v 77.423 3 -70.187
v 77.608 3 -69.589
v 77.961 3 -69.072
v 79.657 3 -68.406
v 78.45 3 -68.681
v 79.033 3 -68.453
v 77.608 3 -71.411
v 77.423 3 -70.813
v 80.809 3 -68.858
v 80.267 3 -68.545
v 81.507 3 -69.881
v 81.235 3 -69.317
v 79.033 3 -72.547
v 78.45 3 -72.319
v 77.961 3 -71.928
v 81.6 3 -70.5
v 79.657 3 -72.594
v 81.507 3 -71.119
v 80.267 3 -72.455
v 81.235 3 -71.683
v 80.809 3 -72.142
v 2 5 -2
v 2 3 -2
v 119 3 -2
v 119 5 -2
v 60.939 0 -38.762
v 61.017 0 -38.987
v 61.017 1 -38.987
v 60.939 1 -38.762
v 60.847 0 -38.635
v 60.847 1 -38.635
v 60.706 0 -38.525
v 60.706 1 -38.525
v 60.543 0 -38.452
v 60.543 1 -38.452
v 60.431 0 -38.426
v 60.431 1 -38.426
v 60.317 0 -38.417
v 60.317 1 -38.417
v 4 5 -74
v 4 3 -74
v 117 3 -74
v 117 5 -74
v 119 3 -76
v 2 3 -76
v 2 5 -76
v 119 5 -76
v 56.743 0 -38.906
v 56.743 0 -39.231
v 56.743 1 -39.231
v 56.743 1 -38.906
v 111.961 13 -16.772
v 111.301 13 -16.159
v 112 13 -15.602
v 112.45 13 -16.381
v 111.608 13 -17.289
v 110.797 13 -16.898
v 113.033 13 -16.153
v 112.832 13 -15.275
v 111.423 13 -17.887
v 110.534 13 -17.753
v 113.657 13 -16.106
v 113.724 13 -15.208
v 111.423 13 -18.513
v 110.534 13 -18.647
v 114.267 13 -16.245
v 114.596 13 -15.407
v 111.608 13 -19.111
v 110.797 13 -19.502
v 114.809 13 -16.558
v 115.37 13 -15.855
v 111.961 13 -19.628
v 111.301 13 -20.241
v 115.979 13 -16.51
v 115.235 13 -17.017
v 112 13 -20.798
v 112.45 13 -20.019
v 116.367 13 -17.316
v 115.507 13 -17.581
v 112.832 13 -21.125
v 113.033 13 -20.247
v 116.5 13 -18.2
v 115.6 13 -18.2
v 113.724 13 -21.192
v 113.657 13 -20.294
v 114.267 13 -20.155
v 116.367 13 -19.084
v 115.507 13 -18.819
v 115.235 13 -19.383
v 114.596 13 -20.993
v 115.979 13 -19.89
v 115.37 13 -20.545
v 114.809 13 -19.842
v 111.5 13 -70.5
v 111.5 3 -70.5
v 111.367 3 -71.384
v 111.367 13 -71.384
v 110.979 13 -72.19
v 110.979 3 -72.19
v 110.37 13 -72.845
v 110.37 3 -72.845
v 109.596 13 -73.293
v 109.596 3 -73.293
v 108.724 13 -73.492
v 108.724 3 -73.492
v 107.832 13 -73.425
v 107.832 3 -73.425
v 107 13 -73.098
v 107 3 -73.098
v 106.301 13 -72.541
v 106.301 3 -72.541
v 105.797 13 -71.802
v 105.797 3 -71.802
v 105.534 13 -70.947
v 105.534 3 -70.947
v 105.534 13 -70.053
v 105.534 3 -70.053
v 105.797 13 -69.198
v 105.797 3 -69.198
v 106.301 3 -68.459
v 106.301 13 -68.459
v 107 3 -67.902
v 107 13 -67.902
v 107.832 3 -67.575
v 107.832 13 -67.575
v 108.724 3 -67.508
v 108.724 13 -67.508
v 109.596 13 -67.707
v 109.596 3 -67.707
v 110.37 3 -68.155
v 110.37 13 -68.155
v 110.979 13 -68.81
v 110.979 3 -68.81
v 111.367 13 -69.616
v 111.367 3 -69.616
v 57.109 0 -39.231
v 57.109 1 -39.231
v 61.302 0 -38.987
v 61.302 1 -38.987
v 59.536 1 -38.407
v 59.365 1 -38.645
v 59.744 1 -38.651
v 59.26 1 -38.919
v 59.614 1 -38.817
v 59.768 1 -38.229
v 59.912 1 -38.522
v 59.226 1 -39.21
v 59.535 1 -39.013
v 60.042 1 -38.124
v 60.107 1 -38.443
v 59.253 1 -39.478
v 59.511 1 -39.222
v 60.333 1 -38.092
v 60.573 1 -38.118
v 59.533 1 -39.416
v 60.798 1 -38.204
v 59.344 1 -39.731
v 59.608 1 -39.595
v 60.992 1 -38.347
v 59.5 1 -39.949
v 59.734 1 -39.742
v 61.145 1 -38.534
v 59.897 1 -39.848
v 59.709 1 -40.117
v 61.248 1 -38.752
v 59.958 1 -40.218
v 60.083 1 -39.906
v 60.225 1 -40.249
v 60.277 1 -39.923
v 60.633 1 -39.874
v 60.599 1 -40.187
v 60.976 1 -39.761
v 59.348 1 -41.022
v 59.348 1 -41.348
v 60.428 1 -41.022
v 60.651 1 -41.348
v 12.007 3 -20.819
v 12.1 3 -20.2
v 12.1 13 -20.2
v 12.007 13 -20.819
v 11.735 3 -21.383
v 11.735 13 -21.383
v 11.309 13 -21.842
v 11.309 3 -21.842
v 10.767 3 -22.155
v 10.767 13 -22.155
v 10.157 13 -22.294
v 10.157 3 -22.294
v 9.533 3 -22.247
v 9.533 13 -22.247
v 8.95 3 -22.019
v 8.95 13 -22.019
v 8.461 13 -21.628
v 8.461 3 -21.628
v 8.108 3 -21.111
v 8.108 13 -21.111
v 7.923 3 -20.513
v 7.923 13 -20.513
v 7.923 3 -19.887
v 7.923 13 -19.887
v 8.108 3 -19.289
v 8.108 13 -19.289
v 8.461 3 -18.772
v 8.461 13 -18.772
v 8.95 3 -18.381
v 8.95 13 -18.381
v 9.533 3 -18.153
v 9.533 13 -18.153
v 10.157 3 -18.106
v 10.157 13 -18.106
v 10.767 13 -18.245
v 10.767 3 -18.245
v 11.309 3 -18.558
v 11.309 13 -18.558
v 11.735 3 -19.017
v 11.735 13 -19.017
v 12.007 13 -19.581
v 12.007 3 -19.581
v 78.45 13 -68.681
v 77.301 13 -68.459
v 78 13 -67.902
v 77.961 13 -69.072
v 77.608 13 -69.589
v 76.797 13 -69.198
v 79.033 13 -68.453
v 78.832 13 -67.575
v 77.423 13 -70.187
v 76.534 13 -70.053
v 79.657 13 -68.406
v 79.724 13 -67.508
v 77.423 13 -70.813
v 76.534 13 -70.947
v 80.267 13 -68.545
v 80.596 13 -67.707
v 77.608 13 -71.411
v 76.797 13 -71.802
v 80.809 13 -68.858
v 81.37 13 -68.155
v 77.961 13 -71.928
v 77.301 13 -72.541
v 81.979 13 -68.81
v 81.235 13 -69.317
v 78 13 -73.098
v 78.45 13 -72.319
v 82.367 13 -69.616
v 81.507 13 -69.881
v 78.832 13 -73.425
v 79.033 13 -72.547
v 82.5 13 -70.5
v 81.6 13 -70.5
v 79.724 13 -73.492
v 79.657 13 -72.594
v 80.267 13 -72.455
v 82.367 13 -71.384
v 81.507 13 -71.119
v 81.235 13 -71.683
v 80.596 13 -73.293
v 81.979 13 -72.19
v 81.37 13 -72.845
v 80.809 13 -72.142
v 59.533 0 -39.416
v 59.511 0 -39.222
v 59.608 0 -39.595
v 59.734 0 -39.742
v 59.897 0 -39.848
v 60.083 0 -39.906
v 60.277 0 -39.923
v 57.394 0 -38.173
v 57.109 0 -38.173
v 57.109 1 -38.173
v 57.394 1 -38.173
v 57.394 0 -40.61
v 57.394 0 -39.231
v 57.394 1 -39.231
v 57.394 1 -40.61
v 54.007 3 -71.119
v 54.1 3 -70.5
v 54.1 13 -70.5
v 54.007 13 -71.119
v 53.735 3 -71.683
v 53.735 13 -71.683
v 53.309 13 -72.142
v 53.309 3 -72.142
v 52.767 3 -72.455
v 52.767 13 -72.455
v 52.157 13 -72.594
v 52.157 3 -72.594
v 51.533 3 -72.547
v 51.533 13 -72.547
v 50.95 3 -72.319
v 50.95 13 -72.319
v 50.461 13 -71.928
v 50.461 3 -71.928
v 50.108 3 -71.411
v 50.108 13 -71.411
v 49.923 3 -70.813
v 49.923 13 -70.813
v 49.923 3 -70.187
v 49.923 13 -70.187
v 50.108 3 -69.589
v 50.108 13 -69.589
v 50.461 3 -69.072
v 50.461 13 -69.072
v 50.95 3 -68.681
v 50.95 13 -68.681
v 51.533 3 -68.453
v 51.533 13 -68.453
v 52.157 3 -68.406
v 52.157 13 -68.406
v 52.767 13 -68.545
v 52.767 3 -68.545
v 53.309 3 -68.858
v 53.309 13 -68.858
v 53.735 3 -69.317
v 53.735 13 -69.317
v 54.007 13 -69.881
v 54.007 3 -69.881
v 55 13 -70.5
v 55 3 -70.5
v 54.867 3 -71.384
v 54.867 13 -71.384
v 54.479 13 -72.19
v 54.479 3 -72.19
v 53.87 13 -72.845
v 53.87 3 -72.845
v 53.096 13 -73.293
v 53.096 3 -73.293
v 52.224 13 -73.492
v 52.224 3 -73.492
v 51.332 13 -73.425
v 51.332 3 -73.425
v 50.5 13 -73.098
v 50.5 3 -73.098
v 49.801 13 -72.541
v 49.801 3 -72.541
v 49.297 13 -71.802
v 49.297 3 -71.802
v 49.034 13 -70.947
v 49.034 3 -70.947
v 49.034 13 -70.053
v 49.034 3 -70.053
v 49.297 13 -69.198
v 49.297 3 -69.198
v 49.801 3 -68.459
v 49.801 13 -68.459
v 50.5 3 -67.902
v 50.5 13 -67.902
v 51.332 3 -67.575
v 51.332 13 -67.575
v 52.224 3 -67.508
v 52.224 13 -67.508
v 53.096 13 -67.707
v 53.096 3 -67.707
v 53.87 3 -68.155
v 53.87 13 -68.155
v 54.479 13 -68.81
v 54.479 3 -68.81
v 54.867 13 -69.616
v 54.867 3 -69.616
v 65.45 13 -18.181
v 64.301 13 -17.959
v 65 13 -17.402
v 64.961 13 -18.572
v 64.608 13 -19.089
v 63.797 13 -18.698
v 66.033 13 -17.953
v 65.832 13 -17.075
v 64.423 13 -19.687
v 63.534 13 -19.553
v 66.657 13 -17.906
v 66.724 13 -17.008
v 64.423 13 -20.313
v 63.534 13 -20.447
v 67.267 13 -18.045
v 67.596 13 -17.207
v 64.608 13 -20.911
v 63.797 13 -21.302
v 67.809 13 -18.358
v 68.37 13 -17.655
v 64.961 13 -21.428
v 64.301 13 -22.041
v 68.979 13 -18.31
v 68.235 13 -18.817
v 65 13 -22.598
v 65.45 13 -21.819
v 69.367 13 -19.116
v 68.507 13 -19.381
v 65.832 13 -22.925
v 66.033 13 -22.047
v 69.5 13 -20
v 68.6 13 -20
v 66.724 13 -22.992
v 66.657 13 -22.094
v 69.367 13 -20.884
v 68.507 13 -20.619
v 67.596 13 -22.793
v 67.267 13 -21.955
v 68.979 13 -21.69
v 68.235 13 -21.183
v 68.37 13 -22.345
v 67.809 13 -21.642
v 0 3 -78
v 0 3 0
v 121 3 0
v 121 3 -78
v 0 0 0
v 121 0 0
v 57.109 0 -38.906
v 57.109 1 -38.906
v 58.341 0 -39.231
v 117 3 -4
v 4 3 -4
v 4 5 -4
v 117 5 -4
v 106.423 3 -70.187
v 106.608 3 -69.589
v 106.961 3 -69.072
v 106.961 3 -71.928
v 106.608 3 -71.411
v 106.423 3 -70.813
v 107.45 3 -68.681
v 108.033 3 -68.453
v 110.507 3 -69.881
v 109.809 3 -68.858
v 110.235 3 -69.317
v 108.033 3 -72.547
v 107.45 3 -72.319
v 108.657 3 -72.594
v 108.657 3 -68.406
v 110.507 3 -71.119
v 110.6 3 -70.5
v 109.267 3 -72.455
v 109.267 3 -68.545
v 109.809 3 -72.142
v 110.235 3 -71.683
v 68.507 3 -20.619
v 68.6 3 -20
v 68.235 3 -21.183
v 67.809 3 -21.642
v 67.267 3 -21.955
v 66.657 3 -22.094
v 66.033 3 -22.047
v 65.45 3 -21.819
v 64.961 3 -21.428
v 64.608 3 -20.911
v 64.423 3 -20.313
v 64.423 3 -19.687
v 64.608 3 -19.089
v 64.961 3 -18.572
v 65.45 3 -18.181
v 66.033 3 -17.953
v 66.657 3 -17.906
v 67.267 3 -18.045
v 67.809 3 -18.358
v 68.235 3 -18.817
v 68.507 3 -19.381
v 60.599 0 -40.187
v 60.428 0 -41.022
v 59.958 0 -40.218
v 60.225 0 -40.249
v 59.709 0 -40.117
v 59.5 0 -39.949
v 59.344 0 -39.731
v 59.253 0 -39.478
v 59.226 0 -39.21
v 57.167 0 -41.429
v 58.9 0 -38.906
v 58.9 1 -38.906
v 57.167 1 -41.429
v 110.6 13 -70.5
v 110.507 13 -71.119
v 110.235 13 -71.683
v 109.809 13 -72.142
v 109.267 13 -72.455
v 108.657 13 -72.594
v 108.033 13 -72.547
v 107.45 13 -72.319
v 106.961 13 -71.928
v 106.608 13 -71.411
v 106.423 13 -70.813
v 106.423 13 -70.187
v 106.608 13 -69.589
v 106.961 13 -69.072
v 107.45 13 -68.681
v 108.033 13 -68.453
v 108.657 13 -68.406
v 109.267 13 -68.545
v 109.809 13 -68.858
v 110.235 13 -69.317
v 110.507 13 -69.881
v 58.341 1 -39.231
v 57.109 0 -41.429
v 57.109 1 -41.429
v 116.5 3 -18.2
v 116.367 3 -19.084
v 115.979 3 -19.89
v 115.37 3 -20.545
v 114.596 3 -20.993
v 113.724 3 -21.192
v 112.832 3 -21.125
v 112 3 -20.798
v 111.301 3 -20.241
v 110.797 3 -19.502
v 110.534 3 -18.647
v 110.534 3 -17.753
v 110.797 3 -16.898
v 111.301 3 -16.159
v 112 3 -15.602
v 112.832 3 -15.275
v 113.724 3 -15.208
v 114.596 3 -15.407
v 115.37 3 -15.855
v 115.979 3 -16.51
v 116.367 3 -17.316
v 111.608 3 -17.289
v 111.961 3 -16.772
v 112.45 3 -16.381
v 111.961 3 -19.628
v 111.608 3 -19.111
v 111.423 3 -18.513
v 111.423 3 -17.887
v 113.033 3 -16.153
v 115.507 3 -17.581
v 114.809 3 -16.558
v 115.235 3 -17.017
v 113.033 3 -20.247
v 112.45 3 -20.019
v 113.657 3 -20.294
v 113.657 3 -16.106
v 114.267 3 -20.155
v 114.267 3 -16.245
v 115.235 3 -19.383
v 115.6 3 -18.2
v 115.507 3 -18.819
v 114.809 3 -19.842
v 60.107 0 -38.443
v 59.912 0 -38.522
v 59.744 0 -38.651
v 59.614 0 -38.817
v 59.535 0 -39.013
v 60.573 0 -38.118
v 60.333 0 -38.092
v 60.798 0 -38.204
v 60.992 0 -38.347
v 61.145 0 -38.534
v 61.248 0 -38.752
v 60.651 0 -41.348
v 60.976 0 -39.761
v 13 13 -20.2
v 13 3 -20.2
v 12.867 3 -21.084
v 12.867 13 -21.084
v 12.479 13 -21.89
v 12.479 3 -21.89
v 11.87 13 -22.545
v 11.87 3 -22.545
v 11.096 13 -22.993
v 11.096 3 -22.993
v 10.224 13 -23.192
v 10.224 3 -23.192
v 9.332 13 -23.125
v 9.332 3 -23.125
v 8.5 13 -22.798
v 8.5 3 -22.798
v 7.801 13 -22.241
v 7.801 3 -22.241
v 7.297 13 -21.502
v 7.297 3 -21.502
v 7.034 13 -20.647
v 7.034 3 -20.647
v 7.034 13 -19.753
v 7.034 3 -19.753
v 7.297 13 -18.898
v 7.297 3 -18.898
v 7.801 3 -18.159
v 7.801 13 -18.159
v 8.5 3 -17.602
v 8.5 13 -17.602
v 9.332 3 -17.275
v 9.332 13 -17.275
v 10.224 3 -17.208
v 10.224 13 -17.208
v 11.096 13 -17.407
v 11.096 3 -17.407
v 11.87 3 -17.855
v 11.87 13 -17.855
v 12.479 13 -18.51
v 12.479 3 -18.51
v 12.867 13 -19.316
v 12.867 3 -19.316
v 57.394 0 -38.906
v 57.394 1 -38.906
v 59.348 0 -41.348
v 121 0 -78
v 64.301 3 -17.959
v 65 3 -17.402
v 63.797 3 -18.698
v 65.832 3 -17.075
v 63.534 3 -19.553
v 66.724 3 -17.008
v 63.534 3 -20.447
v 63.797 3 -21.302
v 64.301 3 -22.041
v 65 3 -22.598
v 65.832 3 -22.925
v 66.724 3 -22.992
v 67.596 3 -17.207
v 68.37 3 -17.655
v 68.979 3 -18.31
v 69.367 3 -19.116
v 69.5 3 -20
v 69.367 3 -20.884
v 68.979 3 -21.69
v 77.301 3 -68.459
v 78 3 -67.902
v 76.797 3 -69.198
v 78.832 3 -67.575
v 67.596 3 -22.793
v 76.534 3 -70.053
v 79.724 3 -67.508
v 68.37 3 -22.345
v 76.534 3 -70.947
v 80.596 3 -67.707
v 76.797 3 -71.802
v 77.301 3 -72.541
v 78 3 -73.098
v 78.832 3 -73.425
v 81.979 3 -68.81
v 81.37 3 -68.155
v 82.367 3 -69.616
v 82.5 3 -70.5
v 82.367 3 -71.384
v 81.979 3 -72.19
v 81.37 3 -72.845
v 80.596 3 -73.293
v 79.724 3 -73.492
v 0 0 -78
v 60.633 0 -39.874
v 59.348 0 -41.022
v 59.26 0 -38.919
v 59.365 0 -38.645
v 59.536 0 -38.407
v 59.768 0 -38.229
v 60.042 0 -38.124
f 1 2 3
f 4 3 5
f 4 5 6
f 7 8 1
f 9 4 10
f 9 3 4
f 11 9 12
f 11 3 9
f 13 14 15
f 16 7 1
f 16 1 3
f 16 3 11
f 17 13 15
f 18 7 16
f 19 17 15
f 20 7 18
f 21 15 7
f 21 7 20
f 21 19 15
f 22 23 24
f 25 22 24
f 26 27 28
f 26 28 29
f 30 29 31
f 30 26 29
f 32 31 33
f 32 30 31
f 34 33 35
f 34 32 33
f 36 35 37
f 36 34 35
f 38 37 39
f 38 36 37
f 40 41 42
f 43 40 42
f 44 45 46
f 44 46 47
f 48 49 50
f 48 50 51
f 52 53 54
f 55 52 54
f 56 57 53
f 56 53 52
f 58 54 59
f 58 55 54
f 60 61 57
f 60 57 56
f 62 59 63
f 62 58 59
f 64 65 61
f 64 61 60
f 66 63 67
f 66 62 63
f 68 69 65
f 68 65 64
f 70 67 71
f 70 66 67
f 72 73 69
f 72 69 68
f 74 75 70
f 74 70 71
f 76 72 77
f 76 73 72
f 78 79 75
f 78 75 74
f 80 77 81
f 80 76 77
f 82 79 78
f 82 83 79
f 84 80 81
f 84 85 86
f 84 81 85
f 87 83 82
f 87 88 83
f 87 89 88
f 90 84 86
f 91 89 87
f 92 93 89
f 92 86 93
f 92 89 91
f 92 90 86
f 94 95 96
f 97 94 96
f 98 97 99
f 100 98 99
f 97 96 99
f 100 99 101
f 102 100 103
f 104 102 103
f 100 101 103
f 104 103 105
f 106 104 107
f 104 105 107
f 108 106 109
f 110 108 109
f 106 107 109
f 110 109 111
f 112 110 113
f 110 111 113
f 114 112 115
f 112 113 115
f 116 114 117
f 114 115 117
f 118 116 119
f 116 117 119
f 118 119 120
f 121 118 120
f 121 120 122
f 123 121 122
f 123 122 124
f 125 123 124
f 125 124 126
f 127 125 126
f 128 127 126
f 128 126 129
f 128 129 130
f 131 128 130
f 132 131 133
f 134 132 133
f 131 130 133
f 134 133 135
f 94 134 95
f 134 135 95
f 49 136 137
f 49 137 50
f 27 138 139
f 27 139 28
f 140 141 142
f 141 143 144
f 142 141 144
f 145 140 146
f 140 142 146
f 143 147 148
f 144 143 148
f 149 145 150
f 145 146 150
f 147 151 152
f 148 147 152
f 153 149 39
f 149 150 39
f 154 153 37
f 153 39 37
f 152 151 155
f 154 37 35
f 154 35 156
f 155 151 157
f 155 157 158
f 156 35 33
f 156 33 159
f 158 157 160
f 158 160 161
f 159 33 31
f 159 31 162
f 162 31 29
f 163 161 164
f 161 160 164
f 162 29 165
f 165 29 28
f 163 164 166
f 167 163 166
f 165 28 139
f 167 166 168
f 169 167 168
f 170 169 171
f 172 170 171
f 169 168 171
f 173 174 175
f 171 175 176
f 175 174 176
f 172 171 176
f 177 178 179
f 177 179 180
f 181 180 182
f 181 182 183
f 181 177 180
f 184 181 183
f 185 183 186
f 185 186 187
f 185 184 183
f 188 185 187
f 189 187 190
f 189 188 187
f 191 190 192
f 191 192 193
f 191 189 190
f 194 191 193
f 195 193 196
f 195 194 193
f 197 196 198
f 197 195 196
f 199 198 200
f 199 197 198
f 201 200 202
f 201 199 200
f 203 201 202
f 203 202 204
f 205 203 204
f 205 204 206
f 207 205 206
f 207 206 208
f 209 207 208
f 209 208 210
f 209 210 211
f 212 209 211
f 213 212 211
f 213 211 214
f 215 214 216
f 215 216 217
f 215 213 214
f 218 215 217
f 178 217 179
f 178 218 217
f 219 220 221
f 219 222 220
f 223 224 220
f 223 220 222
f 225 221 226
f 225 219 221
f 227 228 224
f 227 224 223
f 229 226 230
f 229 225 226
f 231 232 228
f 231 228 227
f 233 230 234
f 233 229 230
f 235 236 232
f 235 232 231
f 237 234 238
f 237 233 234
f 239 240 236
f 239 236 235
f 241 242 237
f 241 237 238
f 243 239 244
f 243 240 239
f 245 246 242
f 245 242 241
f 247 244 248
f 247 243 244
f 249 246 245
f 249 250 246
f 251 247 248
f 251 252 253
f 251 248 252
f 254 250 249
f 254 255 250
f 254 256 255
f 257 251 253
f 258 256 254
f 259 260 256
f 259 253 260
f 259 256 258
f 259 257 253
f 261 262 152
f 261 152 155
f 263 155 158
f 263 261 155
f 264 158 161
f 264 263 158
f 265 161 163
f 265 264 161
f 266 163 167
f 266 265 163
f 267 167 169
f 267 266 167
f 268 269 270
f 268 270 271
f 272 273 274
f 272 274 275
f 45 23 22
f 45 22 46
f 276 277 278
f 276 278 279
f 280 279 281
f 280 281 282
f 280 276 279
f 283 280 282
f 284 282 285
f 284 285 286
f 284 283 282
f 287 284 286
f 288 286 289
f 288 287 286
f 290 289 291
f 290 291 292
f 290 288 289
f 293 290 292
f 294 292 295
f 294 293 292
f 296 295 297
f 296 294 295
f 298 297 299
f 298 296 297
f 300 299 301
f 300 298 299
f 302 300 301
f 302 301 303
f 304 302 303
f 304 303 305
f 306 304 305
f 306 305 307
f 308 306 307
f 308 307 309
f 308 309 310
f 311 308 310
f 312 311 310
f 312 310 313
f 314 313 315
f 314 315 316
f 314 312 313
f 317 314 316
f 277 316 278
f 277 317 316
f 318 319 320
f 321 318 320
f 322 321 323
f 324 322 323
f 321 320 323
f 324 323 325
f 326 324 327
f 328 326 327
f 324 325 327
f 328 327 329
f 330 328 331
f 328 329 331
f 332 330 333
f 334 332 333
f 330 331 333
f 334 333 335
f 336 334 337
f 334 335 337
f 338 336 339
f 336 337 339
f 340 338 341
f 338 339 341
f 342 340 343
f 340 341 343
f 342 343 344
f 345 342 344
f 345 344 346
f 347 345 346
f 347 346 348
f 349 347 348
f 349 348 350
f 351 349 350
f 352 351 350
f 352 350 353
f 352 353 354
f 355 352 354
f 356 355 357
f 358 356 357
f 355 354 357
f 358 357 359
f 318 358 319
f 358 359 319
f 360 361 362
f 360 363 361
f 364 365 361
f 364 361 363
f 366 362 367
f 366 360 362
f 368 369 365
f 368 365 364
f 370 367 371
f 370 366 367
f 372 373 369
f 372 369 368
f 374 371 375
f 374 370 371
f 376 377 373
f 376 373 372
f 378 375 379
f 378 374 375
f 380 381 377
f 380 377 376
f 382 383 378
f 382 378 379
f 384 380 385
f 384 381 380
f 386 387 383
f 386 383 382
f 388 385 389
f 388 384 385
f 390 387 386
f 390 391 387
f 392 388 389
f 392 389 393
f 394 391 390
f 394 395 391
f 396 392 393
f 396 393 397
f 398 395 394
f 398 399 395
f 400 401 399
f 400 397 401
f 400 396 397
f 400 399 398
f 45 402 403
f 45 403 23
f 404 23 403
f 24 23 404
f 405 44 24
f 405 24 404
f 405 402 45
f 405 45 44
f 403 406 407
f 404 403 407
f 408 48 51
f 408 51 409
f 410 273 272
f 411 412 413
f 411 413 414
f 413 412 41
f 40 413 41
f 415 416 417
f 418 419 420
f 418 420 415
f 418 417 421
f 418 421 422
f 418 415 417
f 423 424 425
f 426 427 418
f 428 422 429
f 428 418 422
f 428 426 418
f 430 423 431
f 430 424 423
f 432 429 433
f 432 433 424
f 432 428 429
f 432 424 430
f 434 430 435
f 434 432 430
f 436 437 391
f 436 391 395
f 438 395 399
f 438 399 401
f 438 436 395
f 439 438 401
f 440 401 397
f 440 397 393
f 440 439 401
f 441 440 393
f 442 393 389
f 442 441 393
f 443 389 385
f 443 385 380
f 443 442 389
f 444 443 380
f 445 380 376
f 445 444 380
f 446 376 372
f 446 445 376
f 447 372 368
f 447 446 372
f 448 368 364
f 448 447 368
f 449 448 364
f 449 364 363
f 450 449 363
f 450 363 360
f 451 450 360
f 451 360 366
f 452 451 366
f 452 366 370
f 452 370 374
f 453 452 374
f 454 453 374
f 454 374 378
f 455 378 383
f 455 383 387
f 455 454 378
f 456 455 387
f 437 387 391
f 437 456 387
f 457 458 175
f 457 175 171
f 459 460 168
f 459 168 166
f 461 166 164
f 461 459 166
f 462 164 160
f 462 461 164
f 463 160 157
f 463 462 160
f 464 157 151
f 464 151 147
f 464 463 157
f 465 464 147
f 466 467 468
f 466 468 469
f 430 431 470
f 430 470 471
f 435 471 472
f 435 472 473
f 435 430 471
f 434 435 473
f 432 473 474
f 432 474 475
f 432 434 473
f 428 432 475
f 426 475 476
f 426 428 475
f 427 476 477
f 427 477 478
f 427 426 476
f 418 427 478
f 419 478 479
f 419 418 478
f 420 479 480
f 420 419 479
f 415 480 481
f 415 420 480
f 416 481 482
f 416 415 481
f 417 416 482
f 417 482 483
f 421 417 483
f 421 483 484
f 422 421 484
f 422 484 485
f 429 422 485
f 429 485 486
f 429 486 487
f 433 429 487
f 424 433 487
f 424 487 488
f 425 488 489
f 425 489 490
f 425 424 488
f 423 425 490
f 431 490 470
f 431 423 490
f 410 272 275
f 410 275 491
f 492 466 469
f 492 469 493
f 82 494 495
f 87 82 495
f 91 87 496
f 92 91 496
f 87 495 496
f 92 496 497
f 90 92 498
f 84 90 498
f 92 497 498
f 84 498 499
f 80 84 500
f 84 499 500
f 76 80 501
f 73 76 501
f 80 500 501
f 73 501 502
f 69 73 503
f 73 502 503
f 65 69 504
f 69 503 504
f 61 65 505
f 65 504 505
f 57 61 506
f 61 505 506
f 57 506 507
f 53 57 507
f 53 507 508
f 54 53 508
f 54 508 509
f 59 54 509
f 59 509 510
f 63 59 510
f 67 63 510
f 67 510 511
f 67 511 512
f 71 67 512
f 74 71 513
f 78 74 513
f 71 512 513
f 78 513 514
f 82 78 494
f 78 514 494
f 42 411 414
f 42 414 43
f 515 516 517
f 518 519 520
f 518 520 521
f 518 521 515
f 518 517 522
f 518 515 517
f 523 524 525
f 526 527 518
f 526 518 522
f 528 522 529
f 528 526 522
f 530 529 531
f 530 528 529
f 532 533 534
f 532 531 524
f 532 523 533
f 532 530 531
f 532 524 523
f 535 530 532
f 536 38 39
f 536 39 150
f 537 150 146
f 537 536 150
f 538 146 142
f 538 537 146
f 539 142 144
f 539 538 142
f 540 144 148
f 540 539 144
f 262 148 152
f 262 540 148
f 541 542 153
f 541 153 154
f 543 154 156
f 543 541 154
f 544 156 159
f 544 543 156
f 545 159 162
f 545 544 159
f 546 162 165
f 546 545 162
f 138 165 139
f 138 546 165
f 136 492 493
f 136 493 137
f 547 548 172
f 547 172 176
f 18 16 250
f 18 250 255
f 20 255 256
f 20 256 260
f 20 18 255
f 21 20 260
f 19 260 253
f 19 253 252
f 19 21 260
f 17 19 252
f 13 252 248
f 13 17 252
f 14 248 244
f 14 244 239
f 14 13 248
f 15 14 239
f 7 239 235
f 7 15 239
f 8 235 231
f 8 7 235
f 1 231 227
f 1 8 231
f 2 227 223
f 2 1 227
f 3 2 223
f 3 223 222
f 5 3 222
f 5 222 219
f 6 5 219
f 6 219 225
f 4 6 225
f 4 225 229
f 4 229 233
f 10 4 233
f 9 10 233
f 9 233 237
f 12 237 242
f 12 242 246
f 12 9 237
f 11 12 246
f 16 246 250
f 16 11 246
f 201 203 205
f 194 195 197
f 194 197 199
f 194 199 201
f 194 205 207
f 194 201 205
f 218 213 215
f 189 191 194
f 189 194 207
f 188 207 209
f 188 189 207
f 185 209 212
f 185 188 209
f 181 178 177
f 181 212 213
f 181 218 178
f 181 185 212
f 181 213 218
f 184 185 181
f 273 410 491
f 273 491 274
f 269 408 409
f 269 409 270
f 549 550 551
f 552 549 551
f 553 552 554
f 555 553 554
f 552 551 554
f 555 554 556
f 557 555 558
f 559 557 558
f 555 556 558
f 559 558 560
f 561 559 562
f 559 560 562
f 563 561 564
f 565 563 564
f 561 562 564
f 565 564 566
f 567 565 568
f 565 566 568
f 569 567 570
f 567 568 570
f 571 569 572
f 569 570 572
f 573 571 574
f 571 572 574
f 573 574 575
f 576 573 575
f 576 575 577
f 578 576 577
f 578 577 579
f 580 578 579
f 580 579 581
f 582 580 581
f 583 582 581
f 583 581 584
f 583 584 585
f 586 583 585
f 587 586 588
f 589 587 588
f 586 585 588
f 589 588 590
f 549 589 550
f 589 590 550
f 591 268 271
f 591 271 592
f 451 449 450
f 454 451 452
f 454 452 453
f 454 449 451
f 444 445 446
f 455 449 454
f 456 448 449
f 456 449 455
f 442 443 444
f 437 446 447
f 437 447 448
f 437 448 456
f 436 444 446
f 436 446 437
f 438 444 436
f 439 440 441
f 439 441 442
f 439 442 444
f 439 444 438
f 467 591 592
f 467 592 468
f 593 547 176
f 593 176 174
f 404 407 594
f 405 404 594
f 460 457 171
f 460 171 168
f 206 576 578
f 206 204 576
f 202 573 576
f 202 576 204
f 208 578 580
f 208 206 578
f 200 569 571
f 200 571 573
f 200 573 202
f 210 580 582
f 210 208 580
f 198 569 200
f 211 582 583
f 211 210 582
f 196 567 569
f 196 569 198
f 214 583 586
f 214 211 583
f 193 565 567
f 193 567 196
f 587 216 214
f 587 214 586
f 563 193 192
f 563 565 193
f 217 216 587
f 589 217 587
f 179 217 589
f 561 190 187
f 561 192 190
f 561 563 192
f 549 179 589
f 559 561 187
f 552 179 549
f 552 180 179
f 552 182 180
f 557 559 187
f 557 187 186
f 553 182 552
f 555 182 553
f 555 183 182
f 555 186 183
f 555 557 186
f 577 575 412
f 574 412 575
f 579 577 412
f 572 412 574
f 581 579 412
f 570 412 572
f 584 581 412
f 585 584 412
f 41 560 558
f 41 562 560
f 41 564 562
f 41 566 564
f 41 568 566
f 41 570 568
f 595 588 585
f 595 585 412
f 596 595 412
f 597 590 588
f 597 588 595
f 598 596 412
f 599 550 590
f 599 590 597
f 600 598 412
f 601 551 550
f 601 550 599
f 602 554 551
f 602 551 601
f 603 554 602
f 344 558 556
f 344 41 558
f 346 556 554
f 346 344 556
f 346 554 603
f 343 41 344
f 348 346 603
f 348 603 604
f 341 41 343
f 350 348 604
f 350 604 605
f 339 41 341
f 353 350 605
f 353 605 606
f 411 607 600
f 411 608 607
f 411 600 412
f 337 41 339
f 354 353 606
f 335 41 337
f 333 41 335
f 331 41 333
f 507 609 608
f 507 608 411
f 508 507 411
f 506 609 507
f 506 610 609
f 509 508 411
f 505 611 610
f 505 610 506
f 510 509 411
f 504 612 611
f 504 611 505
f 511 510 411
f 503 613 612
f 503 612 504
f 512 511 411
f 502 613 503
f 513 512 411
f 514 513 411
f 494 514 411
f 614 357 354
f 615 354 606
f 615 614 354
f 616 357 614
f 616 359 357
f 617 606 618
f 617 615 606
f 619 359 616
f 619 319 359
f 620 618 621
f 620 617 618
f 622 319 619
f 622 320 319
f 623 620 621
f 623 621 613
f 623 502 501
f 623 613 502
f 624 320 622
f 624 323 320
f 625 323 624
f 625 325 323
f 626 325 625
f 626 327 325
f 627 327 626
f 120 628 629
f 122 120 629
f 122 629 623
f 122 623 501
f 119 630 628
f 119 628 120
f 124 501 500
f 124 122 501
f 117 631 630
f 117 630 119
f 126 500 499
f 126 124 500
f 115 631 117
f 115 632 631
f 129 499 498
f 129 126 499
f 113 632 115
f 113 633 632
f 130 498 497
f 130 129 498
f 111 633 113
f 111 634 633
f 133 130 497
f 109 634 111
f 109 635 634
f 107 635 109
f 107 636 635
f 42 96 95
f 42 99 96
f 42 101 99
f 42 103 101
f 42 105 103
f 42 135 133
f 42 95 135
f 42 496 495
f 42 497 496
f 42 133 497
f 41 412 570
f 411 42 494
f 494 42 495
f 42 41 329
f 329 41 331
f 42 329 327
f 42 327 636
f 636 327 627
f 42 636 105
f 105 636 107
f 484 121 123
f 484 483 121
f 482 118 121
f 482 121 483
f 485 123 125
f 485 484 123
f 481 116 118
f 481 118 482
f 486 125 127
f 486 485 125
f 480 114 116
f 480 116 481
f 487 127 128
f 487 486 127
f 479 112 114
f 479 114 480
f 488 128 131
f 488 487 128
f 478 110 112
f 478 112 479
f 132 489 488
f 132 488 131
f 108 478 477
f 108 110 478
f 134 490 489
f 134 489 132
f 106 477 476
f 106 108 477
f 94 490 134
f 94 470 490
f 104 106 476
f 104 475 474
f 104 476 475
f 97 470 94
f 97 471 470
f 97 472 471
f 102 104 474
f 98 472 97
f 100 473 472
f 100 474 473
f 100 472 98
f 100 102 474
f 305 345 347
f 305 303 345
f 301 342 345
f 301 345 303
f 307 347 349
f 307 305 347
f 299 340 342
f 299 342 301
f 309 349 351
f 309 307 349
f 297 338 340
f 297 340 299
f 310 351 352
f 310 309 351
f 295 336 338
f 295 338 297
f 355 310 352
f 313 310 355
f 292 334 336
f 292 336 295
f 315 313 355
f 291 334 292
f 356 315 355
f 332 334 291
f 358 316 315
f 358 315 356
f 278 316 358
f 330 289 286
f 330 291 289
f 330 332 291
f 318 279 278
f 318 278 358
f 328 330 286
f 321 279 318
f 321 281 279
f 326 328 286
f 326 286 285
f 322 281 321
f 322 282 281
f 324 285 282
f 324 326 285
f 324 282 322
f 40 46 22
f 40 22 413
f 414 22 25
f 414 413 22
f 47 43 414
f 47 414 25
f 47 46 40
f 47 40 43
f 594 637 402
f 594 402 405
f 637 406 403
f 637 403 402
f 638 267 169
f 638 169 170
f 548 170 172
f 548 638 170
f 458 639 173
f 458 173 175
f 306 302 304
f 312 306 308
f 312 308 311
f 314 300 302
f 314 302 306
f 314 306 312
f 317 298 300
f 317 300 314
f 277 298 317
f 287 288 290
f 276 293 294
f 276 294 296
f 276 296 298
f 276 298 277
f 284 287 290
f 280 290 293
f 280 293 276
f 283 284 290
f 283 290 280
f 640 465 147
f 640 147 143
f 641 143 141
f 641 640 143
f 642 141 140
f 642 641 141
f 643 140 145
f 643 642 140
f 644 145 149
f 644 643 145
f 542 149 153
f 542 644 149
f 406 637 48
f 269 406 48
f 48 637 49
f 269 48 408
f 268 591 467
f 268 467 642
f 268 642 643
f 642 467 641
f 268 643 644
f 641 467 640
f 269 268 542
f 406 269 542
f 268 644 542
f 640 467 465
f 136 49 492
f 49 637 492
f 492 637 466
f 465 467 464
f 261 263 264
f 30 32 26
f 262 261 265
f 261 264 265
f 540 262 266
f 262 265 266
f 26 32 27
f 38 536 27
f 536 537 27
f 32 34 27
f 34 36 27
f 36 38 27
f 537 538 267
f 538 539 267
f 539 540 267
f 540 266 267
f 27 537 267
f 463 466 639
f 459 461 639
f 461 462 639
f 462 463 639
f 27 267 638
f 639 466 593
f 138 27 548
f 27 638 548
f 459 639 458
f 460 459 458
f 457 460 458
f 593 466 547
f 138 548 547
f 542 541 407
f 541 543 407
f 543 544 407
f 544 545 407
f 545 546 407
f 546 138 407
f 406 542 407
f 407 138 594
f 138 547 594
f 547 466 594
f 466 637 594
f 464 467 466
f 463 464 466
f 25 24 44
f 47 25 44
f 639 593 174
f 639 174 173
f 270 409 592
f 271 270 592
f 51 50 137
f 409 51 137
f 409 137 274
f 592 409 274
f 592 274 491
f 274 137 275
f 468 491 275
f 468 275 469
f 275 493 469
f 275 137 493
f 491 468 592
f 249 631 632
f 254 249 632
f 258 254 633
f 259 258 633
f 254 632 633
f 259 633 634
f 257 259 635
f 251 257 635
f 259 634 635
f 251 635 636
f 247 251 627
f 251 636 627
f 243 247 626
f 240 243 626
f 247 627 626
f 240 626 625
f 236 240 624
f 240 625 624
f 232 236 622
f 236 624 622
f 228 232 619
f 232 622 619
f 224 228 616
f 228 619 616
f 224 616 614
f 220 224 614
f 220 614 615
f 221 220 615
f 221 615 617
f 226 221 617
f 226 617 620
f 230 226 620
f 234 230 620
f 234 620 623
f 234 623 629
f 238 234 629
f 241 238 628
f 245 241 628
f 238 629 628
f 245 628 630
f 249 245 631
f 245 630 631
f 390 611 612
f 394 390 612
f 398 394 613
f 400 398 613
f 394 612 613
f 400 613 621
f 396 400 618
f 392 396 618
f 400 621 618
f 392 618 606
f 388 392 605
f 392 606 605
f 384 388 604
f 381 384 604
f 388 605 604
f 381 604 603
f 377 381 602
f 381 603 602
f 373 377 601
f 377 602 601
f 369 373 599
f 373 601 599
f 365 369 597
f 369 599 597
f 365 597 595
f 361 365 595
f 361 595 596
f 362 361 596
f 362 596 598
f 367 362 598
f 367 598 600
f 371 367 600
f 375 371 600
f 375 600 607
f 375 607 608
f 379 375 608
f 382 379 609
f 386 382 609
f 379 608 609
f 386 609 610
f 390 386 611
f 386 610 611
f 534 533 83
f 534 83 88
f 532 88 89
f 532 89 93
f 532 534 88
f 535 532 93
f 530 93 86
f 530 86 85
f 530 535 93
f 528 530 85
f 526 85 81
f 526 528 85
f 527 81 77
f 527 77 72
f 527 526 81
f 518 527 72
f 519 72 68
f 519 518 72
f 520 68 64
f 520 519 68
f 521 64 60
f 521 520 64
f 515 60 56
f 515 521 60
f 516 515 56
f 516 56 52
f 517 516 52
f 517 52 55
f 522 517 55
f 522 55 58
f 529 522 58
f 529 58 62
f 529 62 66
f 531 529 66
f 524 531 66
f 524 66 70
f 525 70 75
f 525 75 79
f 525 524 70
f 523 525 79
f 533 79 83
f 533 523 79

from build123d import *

# Parameters (mm, degrees)
SKETCH6_W            = 121
SKETCH6_H            = 78
BOSS_EXTRUDE9_DEPTH  = 3
SKETCH14_W           = 117
SKETCH14_H           = 74
SKETCH14_W_2         = 113
SKETCH14_H_2         = 70
BOSS_EXTRUDE11_DEPTH = 2
SKETCH16_R           = 3
SKETCH16_R_2         = 2.1
BOSS_EXTRUDE12_DEPTH = 10
SKETCH17_R           = 3
SKETCH17_R_2         = 2.1
BOSS_EXTRUDE13_DEPTH = 10
SKETCH18_R           = 3
SKETCH18_R_2         = 2.1
BOSS_EXTRUDE14_DEPTH = 10
SKETCH19_R           = 3
SKETCH19_R_2         = 2.1
BOSS_EXTRUDE15_DEPTH = 10
SKETCH20_R           = 3
SKETCH20_R_2         = 2.1
BOSS_EXTRUDE16_DEPTH = 10
SKETCH21_R           = 3
SKETCH21_R_2         = 2.1
BOSS_EXTRUDE17_DEPTH = 10
CUT_EXTRUDE2_DEPTH   = 1


with BuildPart() as part:
    # Sketch6 → Boss-Extrude9 (new body)
    with BuildSketch(Plane(origin=(0, 0, 0), x_dir=(1, 0, 0), z_dir=(0, 1, 0))):
        with Locations((60.5, 39)):
            Rectangle(SKETCH6_W, SKETCH6_H)
    extrude(amount=BOSS_EXTRUDE9_DEPTH)

    # Sketch14 → Boss-Extrude11 (add)
    with BuildSketch(Plane(origin=(0, 3, 0), x_dir=(1, 0, 0), z_dir=(0, 1, 0))):
        with Locations((60.5, 39)):
            Rectangle(SKETCH14_W, SKETCH14_H)
        with Locations((60.5, 39)):
            Rectangle(SKETCH14_W_2, SKETCH14_H_2, mode=Mode.SUBTRACT)
    extrude(amount=BOSS_EXTRUDE11_DEPTH)

    # Sketch16 → Boss-Extrude12 (add)
    with BuildSketch(Plane(origin=(0, 3, 0), x_dir=(1, 0, 0), z_dir=(0, 1, 0))):
        with Locations((52, 70.5)):
            Circle(SKETCH16_R)
        with Locations((52, 70.5)):
            Circle(SKETCH16_R_2, mode=Mode.SUBTRACT)
    extrude(amount=BOSS_EXTRUDE12_DEPTH)

    # Sketch17 → Boss-Extrude13 (add)
    with BuildSketch(Plane(origin=(0, 3, 0), x_dir=(1, 0, 0), z_dir=(0, 1, 0))):
        with Locations((108.5, 70.5)):
            Circle(SKETCH17_R)
        with Locations((108.5, 70.5)):
            Circle(SKETCH17_R_2, mode=Mode.SUBTRACT)
    extrude(amount=BOSS_EXTRUDE13_DEPTH)

    # Sketch18 → Boss-Extrude14 (add)
    with BuildSketch(Plane(origin=(0, 3, 0), x_dir=(1, 0, 0), z_dir=(0, 1, 0))):
        with Locations((79.5, 70.5)):
            Circle(SKETCH18_R)
        with Locations((79.5, 70.5)):
            Circle(SKETCH18_R_2, mode=Mode.SUBTRACT)
    extrude(amount=BOSS_EXTRUDE14_DEPTH)

    # Sketch19 → Boss-Extrude15 (add)
    with BuildSketch(Plane(origin=(0, 3, 0), x_dir=(1, 0, 0), z_dir=(0, 1, 0))):
        with Locations((10, 20.2)):
            Circle(SKETCH19_R)
        with Locations((10, 20.2)):
            Circle(SKETCH19_R_2, mode=Mode.SUBTRACT)
    extrude(amount=BOSS_EXTRUDE15_DEPTH)

    # Sketch20 → Boss-Extrude16 (add)
    with BuildSketch(Plane(origin=(0, 3, 0), x_dir=(1, 0, 0), z_dir=(0, 1, 0))):
        with Locations((113.5, 18.2)):
            Circle(SKETCH20_R)
        with Locations((113.5, 18.2)):
            Circle(SKETCH20_R_2, mode=Mode.SUBTRACT)
    extrude(amount=BOSS_EXTRUDE16_DEPTH)

    # Sketch21 → Boss-Extrude17 (add)
    with BuildSketch(Plane(origin=(0, 3, 0), x_dir=(1, 0, 0), z_dir=(0, 1, 0))):
        with Locations((66.5, 20)):
            Circle(SKETCH21_R)
        with Locations((66.5, 20)):
            Circle(SKETCH21_R_2, mode=Mode.SUBTRACT)
    extrude(amount=BOSS_EXTRUDE17_DEPTH)

    # Sketch22 → Cut-Extrude2 (cut)
    with BuildSketch(Plane(origin=(0, 0, 0), x_dir=(-1, 0, 0), z_dir=(0, -1, 0))):
        with BuildLine():
            Line((-59.348084392, 41.348070521), (-59.348084392, 41.022429495))
            Line((-59.348084392, 41.022429495), (-60.428042325, 41.022429495))
            Line((-60.428042325, 41.022429495), (-60.599131067, 40.187338349))
            add(Edge.make_bspline(
                [(-60.599131067, 40.187338349), (-60.565516095, 40.196618667), (-60.500392404, 40.214597816), (-60.404271673, 40.234560193), (-60.313020174, 40.246593846), (-60.253806088, 40.248236963), (-60.225152702, 40.249032059)],
                knots=[0, 0, 0, 0, 0.000104595, 0.000202637, 0.000294305, 0.000380252, 0.000380252, 0.000380252, 0.000380252], degree=3))
            add(Edge.make_bspline(
                [(-60.225152702, 40.249032059), (-60.189698166, 40.248264675), (-60.119985692, 40.246755805), (-60.017987504, 40.232267056), (-59.920621236, 40.209461562), (-59.828090515, 40.177602232), (-59.740224158, 40.136862688), (-59.657830585, 40.085972028), (-59.579673049, 40.026523934), (-59.507153696, 39.958175245), (-59.441363788, 39.882953493), (-59.383518926, 39.802074567), (-59.334385719, 39.716324473), (-59.294869892, 39.624883921), (-59.263315531, 39.528763832), (-59.242313364, 39.426952846), (-59.228328207, 39.320410623), (-59.226765757, 39.247562906), (-59.225969008, 39.210415273)],
                knots=[0, 0, 0, 0, 0.000106308, 0.000209029, 0.000308378, 0.000405929, 0.000502102, 0.000598312, 0.00069588, 0.000796219, 0.000896736, 0.000995218, 0.001094066, 0.001192613, 0.001293582, 0.001396995, 0.001504047, 0.001615439, 0.001615439, 0.001615439, 0.001615439], degree=3))
            add(Edge.make_bspline(
                [(-59.225969008, 39.210415273), (-59.226572326, 39.184541544), (-59.227770809, 39.133143748), (-59.233865528, 39.056812938), (-59.24560007, 38.982098082), (-59.261355077, 38.908989269), (-59.281804271, 38.83762491), (-59.306559341, 38.767800738), (-59.336854309, 38.699951345), (-59.370084199, 38.633434737), (-59.407500647, 38.569754662), (-59.449028293, 38.510201653), (-59.492902703, 38.453882341), (-59.540111674, 38.40140074), (-59.591094005, 38.353101717), (-59.645232261, 38.308698633), (-59.702094442, 38.267440569), (-59.762560269, 38.231002278), (-59.825282378, 38.197471596), (-59.891166547, 38.169963816), (-59.958713039, 38.145370694), (-60.028894034, 38.125767765), (-60.101550564, 38.110407519), (-60.176802396, 38.099974831), (-60.254254861, 38.092376206), (-60.306755765, 38.091900539), (-60.333275698, 38.091660265)],
                knots=[0, 0, 0, 0, 7.7636e-05, 0.000154223, 0.000229512, 0.000304362, 0.000378447, 0.000452077, 0.000526407, 0.000601214, 0.00067506, 0.000747747, 0.00081887, 0.000889121, 0.000959302, 0.001029336, 0.001099058, 0.00116985, 0.001240974, 0.00131221, 0.00138383, 0.001456517, 0.001530612, 0.001606437, 0.001684346, 0.001763871, 0.001763871, 0.001763871, 0.001763871], degree=3))
            add(Edge.make_bspline(
                [(-60.333275698, 38.091660265), (-60.364911562, 38.092286953), (-60.427151387, 38.093519889), (-60.518337902, 38.106418087), (-60.606071865, 38.124891068), (-60.689647029, 38.152682541), (-60.769812389, 38.187505301), (-60.845488712, 38.2315164), (-60.918609666, 38.281390301), (-60.986202728, 38.34024605), (-61.048937202, 38.404576704), (-61.105095249, 38.474388279), (-61.15510928, 38.548528558), (-61.198178379, 38.627357598), (-61.23491587, 38.710668266), (-61.263776609, 38.798772702), (-61.287070545, 38.891210563), (-61.296925219, 38.954849819), (-61.301930546, 38.987173085)],
                knots=[0, 0, 0, 0, 9.4843e-05, 0.000186593, 0.000275792, 0.000363484, 0.000450342, 0.000537514, 0.000625728, 0.000715478, 0.000805885, 0.000894984, 0.00098389, 0.001073836, 0.001164117, 0.001256635, 0.001351658, 0.001449737, 0.001449737, 0.001449737, 0.001449737], degree=3))
            Line((-61.301930546, 38.987173085), (-61.016994649, 38.987173085))
            add(Edge.make_bspline(
                [(-61.016994649, 38.987173085), (-61.009983743, 38.956895875), (-60.996508393, 38.898701395), (-60.966930321, 38.816939392), (-60.930766277, 38.744078382), (-60.887763761, 38.679154546), (-60.836464805, 38.62254067), (-60.777927394, 38.57208805), (-60.712297674, 38.526572039), (-60.63936953, 38.488632815), (-60.562431951, 38.45627616), (-60.48190741, 38.43472998), (-60.399988467, 38.419579884), (-60.34458166, 38.418063358), (-60.31673924, 38.41730129)],
                knots=[0, 0, 0, 0, 9.3172e-05, 0.000179081, 0.000260145, 0.000336703, 0.000411917, 0.000488562, 0.000568128, 0.000650923, 0.00073478, 0.000817953, 0.000900557, 0.000983994, 0.000983994, 0.000983994, 0.000983994], degree=3))
            add(Edge.make_bspline(
                [(-60.31673924, 38.41730129), (-60.289562651, 38.418045853), (-60.236051725, 38.419511903), (-60.157301396, 38.430795864), (-60.081271146, 38.448174518), (-60.008711186, 38.474182172), (-59.93835179, 38.50579131), (-59.871972727, 38.546354271), (-59.807653688, 38.59303586), (-59.747393881, 38.646517945), (-59.692203809, 38.70545474), (-59.643439328, 38.768480661), (-59.602820271, 38.835715229), (-59.568590044, 38.905994446), (-59.542597408, 38.980088566), (-59.524054518, 39.057650346), (-59.513166029, 39.138871364), (-59.511668173, 39.194269952), (-59.510904905, 39.222499607)],
                knots=[0, 0, 0, 0, 8.15e-05, 0.000160473, 0.000238226, 0.000315066, 0.000391338, 0.000469218, 0.000547964, 0.000629516, 0.000710512, 0.000789892, 0.000868102, 0.000945761, 0.001024012, 0.00110315, 0.001184644, 0.001269321, 0.001269321, 0.001269321, 0.001269321], degree=3))
            add(Edge.make_bspline(
                [(-59.510904905, 39.222499607), (-59.51150224, 39.247968325), (-59.512671438, 39.297819716), (-59.52222417, 39.370753282), (-59.53884028, 39.439762399), (-59.561903372, 39.505180311), (-59.591185496, 39.567068719), (-59.626968937, 39.625491495), (-59.669925234, 39.679678615), (-59.718994304, 39.729655432), (-59.772749813, 39.775778997), (-59.832116636, 39.815098275), (-59.895852427, 39.848176258), (-59.963189278, 39.876722228), (-60.035728864, 39.897224333), (-60.112034667, 39.912616629), (-60.19293068, 39.921520565), (-60.248239805, 39.922755992), (-60.276670129, 39.923391034)],
                knots=[0, 0, 0, 0, 7.6388e-05, 0.000149519, 0.000220172, 0.000288967, 0.000357247, 0.000425206, 0.000494043, 0.000564207, 0.000635056, 0.000706145, 0.000777268, 0.000850264, 0.000925136, 0.001002969, 0.001083601, 0.001168886, 0.001168886, 0.001168886, 0.001168886], degree=3))
            add(Edge.make_bspline(
                [(-60.276670129, 39.923391034), (-60.301279943, 39.922864355), (-60.352092966, 39.921776896), (-60.430037244, 39.913770002), (-60.511944736, 39.900852928), (-60.597501457, 39.883085404), (-60.686964346, 39.859834355), (-60.78014461, 39.831971916), (-60.877238166, 39.798659817), (-60.942659245, 39.773502737), (-60.97628952, 39.760570521)],
                knots=[0, 0, 0, 0, 7.3822e-05, 0.000152423, 0.000234822, 0.000322511, 0.00041445, 0.000512043, 0.000614219, 0.000722306, 0.000722306, 0.000722306, 0.000722306], degree=3))
            Line((-60.97628952, 39.760570521), (-60.650648495, 41.348070521))
            Line((-60.650648495, 41.348070521), (-59.348084392, 41.348070521))
        make_face()
        Polygon((-57.167179945, 41.429480777), (-57.109302341, 41.429480777), (-57.109302341, 39.231403854), (-56.742956187, 39.231403854), (-56.742956187, 38.905762829), (-57.109302341, 38.905762829), (-57.109302341, 38.173070521), (-57.394238238, 38.173070521), (-57.394238238, 38.905762829), (-58.900327982, 38.905762829), align=None)
        Polygon((-57.394238238, 39.231403854), (-57.394238238, 40.610290072), (-58.340632469, 39.231403854), align=None, mode=Mode.SUBTRACT)
    extrude(amount=-CUT_EXTRUDE2_DEPTH, mode=Mode.SUBTRACT)


solid = part.part
